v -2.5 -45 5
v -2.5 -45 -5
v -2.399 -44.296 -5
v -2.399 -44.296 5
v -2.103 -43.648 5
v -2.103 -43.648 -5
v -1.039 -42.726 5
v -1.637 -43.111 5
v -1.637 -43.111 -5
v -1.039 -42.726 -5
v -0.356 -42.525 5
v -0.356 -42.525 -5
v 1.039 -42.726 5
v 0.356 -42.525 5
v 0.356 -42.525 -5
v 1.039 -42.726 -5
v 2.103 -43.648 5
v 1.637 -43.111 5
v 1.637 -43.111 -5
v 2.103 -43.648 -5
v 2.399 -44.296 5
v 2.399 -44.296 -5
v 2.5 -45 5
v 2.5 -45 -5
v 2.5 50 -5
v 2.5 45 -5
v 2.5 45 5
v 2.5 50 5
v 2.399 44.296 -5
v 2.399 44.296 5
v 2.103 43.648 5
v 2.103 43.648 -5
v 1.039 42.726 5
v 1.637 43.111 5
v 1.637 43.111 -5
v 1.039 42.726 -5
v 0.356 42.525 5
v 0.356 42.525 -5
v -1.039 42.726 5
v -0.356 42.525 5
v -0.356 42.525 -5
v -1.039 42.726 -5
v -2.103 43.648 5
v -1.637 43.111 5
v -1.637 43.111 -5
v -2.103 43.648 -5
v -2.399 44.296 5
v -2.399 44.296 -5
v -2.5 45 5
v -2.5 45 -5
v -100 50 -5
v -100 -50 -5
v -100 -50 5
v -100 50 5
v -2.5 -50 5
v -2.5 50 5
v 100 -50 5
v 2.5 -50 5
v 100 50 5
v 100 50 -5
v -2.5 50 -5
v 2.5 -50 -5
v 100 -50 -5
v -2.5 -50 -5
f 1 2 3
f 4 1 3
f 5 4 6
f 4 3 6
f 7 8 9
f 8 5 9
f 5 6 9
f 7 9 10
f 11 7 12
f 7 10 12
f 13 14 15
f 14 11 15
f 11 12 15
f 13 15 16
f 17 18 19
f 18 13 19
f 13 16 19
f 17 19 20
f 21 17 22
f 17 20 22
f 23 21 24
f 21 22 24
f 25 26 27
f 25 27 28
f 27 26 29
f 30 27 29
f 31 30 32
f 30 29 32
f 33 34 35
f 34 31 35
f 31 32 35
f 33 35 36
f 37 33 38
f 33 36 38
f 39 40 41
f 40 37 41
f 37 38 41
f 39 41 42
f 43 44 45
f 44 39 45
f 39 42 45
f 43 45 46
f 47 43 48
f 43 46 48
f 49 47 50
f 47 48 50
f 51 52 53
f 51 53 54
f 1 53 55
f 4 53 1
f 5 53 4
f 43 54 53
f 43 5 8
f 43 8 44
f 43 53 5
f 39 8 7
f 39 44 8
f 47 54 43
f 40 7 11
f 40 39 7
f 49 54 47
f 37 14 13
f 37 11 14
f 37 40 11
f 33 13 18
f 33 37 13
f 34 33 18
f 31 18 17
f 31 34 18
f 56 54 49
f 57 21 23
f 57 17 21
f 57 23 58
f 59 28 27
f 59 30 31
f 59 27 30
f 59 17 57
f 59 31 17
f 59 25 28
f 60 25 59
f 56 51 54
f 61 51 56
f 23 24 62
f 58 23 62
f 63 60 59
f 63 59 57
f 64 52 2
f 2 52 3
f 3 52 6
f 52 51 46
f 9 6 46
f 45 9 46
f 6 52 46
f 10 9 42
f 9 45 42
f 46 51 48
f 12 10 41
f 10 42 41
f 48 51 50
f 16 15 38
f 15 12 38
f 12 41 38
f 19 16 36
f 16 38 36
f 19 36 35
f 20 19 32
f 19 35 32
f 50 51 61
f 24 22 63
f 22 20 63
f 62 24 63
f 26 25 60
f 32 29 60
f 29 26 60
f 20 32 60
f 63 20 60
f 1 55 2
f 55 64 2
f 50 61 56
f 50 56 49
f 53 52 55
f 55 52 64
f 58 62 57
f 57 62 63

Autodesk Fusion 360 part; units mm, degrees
sketch "Base_Surface" plane through (0, 0, 0) normal (0, 0, 1) x (1, 0, 0)
  line L0 (-100, 0) -> (-100, 50)
  line L1 (-100, 50) -> (-2.5, 50)
  line L2 (-2.5, 50) -> (-2.5, 45)
  arc A0 (-2.5, 45) -> (2.5, 45) centre (0, 45) ccw
  line L3 (2.5, 45) -> (2.5, 50)
  line L4 (2.5, 50) -> (100, 50)
  line L5 (100, 50) -> (100, 0)
  line L6 (-100, 0) -> (100, 0) construction
  line L7 (-100, 42.5) -> (100, 42.5) construction
  line L8 (0, 0) -> (0, 45) construction
  line L9 (-100, 0) -> (-100, -50)
  line L10 (-100, -50) -> (-2.5, -50)
  line L11 (2.5, -50) -> (100, -50)
  line L12 (100, -50) -> (100, 0)
  line L13 (2.5, -45) -> (2.5, -50)
  arc A1 (2.5, -45) -> (-2.5, -45) centre (0, -45) ccw
  line L14 (-2.5, -50) -> (-2.5, -45)
  dimension "Total_Width" = 200
  dimension "Notch_Radius" = 2.5
  dimension "Notch_Height" = 7.5
  dimension "Total_Height" = 100
extrude "Extrude1" add sketch "Base_Surface" along normal mid plane 10
equation "Thickness = 1 cm"
